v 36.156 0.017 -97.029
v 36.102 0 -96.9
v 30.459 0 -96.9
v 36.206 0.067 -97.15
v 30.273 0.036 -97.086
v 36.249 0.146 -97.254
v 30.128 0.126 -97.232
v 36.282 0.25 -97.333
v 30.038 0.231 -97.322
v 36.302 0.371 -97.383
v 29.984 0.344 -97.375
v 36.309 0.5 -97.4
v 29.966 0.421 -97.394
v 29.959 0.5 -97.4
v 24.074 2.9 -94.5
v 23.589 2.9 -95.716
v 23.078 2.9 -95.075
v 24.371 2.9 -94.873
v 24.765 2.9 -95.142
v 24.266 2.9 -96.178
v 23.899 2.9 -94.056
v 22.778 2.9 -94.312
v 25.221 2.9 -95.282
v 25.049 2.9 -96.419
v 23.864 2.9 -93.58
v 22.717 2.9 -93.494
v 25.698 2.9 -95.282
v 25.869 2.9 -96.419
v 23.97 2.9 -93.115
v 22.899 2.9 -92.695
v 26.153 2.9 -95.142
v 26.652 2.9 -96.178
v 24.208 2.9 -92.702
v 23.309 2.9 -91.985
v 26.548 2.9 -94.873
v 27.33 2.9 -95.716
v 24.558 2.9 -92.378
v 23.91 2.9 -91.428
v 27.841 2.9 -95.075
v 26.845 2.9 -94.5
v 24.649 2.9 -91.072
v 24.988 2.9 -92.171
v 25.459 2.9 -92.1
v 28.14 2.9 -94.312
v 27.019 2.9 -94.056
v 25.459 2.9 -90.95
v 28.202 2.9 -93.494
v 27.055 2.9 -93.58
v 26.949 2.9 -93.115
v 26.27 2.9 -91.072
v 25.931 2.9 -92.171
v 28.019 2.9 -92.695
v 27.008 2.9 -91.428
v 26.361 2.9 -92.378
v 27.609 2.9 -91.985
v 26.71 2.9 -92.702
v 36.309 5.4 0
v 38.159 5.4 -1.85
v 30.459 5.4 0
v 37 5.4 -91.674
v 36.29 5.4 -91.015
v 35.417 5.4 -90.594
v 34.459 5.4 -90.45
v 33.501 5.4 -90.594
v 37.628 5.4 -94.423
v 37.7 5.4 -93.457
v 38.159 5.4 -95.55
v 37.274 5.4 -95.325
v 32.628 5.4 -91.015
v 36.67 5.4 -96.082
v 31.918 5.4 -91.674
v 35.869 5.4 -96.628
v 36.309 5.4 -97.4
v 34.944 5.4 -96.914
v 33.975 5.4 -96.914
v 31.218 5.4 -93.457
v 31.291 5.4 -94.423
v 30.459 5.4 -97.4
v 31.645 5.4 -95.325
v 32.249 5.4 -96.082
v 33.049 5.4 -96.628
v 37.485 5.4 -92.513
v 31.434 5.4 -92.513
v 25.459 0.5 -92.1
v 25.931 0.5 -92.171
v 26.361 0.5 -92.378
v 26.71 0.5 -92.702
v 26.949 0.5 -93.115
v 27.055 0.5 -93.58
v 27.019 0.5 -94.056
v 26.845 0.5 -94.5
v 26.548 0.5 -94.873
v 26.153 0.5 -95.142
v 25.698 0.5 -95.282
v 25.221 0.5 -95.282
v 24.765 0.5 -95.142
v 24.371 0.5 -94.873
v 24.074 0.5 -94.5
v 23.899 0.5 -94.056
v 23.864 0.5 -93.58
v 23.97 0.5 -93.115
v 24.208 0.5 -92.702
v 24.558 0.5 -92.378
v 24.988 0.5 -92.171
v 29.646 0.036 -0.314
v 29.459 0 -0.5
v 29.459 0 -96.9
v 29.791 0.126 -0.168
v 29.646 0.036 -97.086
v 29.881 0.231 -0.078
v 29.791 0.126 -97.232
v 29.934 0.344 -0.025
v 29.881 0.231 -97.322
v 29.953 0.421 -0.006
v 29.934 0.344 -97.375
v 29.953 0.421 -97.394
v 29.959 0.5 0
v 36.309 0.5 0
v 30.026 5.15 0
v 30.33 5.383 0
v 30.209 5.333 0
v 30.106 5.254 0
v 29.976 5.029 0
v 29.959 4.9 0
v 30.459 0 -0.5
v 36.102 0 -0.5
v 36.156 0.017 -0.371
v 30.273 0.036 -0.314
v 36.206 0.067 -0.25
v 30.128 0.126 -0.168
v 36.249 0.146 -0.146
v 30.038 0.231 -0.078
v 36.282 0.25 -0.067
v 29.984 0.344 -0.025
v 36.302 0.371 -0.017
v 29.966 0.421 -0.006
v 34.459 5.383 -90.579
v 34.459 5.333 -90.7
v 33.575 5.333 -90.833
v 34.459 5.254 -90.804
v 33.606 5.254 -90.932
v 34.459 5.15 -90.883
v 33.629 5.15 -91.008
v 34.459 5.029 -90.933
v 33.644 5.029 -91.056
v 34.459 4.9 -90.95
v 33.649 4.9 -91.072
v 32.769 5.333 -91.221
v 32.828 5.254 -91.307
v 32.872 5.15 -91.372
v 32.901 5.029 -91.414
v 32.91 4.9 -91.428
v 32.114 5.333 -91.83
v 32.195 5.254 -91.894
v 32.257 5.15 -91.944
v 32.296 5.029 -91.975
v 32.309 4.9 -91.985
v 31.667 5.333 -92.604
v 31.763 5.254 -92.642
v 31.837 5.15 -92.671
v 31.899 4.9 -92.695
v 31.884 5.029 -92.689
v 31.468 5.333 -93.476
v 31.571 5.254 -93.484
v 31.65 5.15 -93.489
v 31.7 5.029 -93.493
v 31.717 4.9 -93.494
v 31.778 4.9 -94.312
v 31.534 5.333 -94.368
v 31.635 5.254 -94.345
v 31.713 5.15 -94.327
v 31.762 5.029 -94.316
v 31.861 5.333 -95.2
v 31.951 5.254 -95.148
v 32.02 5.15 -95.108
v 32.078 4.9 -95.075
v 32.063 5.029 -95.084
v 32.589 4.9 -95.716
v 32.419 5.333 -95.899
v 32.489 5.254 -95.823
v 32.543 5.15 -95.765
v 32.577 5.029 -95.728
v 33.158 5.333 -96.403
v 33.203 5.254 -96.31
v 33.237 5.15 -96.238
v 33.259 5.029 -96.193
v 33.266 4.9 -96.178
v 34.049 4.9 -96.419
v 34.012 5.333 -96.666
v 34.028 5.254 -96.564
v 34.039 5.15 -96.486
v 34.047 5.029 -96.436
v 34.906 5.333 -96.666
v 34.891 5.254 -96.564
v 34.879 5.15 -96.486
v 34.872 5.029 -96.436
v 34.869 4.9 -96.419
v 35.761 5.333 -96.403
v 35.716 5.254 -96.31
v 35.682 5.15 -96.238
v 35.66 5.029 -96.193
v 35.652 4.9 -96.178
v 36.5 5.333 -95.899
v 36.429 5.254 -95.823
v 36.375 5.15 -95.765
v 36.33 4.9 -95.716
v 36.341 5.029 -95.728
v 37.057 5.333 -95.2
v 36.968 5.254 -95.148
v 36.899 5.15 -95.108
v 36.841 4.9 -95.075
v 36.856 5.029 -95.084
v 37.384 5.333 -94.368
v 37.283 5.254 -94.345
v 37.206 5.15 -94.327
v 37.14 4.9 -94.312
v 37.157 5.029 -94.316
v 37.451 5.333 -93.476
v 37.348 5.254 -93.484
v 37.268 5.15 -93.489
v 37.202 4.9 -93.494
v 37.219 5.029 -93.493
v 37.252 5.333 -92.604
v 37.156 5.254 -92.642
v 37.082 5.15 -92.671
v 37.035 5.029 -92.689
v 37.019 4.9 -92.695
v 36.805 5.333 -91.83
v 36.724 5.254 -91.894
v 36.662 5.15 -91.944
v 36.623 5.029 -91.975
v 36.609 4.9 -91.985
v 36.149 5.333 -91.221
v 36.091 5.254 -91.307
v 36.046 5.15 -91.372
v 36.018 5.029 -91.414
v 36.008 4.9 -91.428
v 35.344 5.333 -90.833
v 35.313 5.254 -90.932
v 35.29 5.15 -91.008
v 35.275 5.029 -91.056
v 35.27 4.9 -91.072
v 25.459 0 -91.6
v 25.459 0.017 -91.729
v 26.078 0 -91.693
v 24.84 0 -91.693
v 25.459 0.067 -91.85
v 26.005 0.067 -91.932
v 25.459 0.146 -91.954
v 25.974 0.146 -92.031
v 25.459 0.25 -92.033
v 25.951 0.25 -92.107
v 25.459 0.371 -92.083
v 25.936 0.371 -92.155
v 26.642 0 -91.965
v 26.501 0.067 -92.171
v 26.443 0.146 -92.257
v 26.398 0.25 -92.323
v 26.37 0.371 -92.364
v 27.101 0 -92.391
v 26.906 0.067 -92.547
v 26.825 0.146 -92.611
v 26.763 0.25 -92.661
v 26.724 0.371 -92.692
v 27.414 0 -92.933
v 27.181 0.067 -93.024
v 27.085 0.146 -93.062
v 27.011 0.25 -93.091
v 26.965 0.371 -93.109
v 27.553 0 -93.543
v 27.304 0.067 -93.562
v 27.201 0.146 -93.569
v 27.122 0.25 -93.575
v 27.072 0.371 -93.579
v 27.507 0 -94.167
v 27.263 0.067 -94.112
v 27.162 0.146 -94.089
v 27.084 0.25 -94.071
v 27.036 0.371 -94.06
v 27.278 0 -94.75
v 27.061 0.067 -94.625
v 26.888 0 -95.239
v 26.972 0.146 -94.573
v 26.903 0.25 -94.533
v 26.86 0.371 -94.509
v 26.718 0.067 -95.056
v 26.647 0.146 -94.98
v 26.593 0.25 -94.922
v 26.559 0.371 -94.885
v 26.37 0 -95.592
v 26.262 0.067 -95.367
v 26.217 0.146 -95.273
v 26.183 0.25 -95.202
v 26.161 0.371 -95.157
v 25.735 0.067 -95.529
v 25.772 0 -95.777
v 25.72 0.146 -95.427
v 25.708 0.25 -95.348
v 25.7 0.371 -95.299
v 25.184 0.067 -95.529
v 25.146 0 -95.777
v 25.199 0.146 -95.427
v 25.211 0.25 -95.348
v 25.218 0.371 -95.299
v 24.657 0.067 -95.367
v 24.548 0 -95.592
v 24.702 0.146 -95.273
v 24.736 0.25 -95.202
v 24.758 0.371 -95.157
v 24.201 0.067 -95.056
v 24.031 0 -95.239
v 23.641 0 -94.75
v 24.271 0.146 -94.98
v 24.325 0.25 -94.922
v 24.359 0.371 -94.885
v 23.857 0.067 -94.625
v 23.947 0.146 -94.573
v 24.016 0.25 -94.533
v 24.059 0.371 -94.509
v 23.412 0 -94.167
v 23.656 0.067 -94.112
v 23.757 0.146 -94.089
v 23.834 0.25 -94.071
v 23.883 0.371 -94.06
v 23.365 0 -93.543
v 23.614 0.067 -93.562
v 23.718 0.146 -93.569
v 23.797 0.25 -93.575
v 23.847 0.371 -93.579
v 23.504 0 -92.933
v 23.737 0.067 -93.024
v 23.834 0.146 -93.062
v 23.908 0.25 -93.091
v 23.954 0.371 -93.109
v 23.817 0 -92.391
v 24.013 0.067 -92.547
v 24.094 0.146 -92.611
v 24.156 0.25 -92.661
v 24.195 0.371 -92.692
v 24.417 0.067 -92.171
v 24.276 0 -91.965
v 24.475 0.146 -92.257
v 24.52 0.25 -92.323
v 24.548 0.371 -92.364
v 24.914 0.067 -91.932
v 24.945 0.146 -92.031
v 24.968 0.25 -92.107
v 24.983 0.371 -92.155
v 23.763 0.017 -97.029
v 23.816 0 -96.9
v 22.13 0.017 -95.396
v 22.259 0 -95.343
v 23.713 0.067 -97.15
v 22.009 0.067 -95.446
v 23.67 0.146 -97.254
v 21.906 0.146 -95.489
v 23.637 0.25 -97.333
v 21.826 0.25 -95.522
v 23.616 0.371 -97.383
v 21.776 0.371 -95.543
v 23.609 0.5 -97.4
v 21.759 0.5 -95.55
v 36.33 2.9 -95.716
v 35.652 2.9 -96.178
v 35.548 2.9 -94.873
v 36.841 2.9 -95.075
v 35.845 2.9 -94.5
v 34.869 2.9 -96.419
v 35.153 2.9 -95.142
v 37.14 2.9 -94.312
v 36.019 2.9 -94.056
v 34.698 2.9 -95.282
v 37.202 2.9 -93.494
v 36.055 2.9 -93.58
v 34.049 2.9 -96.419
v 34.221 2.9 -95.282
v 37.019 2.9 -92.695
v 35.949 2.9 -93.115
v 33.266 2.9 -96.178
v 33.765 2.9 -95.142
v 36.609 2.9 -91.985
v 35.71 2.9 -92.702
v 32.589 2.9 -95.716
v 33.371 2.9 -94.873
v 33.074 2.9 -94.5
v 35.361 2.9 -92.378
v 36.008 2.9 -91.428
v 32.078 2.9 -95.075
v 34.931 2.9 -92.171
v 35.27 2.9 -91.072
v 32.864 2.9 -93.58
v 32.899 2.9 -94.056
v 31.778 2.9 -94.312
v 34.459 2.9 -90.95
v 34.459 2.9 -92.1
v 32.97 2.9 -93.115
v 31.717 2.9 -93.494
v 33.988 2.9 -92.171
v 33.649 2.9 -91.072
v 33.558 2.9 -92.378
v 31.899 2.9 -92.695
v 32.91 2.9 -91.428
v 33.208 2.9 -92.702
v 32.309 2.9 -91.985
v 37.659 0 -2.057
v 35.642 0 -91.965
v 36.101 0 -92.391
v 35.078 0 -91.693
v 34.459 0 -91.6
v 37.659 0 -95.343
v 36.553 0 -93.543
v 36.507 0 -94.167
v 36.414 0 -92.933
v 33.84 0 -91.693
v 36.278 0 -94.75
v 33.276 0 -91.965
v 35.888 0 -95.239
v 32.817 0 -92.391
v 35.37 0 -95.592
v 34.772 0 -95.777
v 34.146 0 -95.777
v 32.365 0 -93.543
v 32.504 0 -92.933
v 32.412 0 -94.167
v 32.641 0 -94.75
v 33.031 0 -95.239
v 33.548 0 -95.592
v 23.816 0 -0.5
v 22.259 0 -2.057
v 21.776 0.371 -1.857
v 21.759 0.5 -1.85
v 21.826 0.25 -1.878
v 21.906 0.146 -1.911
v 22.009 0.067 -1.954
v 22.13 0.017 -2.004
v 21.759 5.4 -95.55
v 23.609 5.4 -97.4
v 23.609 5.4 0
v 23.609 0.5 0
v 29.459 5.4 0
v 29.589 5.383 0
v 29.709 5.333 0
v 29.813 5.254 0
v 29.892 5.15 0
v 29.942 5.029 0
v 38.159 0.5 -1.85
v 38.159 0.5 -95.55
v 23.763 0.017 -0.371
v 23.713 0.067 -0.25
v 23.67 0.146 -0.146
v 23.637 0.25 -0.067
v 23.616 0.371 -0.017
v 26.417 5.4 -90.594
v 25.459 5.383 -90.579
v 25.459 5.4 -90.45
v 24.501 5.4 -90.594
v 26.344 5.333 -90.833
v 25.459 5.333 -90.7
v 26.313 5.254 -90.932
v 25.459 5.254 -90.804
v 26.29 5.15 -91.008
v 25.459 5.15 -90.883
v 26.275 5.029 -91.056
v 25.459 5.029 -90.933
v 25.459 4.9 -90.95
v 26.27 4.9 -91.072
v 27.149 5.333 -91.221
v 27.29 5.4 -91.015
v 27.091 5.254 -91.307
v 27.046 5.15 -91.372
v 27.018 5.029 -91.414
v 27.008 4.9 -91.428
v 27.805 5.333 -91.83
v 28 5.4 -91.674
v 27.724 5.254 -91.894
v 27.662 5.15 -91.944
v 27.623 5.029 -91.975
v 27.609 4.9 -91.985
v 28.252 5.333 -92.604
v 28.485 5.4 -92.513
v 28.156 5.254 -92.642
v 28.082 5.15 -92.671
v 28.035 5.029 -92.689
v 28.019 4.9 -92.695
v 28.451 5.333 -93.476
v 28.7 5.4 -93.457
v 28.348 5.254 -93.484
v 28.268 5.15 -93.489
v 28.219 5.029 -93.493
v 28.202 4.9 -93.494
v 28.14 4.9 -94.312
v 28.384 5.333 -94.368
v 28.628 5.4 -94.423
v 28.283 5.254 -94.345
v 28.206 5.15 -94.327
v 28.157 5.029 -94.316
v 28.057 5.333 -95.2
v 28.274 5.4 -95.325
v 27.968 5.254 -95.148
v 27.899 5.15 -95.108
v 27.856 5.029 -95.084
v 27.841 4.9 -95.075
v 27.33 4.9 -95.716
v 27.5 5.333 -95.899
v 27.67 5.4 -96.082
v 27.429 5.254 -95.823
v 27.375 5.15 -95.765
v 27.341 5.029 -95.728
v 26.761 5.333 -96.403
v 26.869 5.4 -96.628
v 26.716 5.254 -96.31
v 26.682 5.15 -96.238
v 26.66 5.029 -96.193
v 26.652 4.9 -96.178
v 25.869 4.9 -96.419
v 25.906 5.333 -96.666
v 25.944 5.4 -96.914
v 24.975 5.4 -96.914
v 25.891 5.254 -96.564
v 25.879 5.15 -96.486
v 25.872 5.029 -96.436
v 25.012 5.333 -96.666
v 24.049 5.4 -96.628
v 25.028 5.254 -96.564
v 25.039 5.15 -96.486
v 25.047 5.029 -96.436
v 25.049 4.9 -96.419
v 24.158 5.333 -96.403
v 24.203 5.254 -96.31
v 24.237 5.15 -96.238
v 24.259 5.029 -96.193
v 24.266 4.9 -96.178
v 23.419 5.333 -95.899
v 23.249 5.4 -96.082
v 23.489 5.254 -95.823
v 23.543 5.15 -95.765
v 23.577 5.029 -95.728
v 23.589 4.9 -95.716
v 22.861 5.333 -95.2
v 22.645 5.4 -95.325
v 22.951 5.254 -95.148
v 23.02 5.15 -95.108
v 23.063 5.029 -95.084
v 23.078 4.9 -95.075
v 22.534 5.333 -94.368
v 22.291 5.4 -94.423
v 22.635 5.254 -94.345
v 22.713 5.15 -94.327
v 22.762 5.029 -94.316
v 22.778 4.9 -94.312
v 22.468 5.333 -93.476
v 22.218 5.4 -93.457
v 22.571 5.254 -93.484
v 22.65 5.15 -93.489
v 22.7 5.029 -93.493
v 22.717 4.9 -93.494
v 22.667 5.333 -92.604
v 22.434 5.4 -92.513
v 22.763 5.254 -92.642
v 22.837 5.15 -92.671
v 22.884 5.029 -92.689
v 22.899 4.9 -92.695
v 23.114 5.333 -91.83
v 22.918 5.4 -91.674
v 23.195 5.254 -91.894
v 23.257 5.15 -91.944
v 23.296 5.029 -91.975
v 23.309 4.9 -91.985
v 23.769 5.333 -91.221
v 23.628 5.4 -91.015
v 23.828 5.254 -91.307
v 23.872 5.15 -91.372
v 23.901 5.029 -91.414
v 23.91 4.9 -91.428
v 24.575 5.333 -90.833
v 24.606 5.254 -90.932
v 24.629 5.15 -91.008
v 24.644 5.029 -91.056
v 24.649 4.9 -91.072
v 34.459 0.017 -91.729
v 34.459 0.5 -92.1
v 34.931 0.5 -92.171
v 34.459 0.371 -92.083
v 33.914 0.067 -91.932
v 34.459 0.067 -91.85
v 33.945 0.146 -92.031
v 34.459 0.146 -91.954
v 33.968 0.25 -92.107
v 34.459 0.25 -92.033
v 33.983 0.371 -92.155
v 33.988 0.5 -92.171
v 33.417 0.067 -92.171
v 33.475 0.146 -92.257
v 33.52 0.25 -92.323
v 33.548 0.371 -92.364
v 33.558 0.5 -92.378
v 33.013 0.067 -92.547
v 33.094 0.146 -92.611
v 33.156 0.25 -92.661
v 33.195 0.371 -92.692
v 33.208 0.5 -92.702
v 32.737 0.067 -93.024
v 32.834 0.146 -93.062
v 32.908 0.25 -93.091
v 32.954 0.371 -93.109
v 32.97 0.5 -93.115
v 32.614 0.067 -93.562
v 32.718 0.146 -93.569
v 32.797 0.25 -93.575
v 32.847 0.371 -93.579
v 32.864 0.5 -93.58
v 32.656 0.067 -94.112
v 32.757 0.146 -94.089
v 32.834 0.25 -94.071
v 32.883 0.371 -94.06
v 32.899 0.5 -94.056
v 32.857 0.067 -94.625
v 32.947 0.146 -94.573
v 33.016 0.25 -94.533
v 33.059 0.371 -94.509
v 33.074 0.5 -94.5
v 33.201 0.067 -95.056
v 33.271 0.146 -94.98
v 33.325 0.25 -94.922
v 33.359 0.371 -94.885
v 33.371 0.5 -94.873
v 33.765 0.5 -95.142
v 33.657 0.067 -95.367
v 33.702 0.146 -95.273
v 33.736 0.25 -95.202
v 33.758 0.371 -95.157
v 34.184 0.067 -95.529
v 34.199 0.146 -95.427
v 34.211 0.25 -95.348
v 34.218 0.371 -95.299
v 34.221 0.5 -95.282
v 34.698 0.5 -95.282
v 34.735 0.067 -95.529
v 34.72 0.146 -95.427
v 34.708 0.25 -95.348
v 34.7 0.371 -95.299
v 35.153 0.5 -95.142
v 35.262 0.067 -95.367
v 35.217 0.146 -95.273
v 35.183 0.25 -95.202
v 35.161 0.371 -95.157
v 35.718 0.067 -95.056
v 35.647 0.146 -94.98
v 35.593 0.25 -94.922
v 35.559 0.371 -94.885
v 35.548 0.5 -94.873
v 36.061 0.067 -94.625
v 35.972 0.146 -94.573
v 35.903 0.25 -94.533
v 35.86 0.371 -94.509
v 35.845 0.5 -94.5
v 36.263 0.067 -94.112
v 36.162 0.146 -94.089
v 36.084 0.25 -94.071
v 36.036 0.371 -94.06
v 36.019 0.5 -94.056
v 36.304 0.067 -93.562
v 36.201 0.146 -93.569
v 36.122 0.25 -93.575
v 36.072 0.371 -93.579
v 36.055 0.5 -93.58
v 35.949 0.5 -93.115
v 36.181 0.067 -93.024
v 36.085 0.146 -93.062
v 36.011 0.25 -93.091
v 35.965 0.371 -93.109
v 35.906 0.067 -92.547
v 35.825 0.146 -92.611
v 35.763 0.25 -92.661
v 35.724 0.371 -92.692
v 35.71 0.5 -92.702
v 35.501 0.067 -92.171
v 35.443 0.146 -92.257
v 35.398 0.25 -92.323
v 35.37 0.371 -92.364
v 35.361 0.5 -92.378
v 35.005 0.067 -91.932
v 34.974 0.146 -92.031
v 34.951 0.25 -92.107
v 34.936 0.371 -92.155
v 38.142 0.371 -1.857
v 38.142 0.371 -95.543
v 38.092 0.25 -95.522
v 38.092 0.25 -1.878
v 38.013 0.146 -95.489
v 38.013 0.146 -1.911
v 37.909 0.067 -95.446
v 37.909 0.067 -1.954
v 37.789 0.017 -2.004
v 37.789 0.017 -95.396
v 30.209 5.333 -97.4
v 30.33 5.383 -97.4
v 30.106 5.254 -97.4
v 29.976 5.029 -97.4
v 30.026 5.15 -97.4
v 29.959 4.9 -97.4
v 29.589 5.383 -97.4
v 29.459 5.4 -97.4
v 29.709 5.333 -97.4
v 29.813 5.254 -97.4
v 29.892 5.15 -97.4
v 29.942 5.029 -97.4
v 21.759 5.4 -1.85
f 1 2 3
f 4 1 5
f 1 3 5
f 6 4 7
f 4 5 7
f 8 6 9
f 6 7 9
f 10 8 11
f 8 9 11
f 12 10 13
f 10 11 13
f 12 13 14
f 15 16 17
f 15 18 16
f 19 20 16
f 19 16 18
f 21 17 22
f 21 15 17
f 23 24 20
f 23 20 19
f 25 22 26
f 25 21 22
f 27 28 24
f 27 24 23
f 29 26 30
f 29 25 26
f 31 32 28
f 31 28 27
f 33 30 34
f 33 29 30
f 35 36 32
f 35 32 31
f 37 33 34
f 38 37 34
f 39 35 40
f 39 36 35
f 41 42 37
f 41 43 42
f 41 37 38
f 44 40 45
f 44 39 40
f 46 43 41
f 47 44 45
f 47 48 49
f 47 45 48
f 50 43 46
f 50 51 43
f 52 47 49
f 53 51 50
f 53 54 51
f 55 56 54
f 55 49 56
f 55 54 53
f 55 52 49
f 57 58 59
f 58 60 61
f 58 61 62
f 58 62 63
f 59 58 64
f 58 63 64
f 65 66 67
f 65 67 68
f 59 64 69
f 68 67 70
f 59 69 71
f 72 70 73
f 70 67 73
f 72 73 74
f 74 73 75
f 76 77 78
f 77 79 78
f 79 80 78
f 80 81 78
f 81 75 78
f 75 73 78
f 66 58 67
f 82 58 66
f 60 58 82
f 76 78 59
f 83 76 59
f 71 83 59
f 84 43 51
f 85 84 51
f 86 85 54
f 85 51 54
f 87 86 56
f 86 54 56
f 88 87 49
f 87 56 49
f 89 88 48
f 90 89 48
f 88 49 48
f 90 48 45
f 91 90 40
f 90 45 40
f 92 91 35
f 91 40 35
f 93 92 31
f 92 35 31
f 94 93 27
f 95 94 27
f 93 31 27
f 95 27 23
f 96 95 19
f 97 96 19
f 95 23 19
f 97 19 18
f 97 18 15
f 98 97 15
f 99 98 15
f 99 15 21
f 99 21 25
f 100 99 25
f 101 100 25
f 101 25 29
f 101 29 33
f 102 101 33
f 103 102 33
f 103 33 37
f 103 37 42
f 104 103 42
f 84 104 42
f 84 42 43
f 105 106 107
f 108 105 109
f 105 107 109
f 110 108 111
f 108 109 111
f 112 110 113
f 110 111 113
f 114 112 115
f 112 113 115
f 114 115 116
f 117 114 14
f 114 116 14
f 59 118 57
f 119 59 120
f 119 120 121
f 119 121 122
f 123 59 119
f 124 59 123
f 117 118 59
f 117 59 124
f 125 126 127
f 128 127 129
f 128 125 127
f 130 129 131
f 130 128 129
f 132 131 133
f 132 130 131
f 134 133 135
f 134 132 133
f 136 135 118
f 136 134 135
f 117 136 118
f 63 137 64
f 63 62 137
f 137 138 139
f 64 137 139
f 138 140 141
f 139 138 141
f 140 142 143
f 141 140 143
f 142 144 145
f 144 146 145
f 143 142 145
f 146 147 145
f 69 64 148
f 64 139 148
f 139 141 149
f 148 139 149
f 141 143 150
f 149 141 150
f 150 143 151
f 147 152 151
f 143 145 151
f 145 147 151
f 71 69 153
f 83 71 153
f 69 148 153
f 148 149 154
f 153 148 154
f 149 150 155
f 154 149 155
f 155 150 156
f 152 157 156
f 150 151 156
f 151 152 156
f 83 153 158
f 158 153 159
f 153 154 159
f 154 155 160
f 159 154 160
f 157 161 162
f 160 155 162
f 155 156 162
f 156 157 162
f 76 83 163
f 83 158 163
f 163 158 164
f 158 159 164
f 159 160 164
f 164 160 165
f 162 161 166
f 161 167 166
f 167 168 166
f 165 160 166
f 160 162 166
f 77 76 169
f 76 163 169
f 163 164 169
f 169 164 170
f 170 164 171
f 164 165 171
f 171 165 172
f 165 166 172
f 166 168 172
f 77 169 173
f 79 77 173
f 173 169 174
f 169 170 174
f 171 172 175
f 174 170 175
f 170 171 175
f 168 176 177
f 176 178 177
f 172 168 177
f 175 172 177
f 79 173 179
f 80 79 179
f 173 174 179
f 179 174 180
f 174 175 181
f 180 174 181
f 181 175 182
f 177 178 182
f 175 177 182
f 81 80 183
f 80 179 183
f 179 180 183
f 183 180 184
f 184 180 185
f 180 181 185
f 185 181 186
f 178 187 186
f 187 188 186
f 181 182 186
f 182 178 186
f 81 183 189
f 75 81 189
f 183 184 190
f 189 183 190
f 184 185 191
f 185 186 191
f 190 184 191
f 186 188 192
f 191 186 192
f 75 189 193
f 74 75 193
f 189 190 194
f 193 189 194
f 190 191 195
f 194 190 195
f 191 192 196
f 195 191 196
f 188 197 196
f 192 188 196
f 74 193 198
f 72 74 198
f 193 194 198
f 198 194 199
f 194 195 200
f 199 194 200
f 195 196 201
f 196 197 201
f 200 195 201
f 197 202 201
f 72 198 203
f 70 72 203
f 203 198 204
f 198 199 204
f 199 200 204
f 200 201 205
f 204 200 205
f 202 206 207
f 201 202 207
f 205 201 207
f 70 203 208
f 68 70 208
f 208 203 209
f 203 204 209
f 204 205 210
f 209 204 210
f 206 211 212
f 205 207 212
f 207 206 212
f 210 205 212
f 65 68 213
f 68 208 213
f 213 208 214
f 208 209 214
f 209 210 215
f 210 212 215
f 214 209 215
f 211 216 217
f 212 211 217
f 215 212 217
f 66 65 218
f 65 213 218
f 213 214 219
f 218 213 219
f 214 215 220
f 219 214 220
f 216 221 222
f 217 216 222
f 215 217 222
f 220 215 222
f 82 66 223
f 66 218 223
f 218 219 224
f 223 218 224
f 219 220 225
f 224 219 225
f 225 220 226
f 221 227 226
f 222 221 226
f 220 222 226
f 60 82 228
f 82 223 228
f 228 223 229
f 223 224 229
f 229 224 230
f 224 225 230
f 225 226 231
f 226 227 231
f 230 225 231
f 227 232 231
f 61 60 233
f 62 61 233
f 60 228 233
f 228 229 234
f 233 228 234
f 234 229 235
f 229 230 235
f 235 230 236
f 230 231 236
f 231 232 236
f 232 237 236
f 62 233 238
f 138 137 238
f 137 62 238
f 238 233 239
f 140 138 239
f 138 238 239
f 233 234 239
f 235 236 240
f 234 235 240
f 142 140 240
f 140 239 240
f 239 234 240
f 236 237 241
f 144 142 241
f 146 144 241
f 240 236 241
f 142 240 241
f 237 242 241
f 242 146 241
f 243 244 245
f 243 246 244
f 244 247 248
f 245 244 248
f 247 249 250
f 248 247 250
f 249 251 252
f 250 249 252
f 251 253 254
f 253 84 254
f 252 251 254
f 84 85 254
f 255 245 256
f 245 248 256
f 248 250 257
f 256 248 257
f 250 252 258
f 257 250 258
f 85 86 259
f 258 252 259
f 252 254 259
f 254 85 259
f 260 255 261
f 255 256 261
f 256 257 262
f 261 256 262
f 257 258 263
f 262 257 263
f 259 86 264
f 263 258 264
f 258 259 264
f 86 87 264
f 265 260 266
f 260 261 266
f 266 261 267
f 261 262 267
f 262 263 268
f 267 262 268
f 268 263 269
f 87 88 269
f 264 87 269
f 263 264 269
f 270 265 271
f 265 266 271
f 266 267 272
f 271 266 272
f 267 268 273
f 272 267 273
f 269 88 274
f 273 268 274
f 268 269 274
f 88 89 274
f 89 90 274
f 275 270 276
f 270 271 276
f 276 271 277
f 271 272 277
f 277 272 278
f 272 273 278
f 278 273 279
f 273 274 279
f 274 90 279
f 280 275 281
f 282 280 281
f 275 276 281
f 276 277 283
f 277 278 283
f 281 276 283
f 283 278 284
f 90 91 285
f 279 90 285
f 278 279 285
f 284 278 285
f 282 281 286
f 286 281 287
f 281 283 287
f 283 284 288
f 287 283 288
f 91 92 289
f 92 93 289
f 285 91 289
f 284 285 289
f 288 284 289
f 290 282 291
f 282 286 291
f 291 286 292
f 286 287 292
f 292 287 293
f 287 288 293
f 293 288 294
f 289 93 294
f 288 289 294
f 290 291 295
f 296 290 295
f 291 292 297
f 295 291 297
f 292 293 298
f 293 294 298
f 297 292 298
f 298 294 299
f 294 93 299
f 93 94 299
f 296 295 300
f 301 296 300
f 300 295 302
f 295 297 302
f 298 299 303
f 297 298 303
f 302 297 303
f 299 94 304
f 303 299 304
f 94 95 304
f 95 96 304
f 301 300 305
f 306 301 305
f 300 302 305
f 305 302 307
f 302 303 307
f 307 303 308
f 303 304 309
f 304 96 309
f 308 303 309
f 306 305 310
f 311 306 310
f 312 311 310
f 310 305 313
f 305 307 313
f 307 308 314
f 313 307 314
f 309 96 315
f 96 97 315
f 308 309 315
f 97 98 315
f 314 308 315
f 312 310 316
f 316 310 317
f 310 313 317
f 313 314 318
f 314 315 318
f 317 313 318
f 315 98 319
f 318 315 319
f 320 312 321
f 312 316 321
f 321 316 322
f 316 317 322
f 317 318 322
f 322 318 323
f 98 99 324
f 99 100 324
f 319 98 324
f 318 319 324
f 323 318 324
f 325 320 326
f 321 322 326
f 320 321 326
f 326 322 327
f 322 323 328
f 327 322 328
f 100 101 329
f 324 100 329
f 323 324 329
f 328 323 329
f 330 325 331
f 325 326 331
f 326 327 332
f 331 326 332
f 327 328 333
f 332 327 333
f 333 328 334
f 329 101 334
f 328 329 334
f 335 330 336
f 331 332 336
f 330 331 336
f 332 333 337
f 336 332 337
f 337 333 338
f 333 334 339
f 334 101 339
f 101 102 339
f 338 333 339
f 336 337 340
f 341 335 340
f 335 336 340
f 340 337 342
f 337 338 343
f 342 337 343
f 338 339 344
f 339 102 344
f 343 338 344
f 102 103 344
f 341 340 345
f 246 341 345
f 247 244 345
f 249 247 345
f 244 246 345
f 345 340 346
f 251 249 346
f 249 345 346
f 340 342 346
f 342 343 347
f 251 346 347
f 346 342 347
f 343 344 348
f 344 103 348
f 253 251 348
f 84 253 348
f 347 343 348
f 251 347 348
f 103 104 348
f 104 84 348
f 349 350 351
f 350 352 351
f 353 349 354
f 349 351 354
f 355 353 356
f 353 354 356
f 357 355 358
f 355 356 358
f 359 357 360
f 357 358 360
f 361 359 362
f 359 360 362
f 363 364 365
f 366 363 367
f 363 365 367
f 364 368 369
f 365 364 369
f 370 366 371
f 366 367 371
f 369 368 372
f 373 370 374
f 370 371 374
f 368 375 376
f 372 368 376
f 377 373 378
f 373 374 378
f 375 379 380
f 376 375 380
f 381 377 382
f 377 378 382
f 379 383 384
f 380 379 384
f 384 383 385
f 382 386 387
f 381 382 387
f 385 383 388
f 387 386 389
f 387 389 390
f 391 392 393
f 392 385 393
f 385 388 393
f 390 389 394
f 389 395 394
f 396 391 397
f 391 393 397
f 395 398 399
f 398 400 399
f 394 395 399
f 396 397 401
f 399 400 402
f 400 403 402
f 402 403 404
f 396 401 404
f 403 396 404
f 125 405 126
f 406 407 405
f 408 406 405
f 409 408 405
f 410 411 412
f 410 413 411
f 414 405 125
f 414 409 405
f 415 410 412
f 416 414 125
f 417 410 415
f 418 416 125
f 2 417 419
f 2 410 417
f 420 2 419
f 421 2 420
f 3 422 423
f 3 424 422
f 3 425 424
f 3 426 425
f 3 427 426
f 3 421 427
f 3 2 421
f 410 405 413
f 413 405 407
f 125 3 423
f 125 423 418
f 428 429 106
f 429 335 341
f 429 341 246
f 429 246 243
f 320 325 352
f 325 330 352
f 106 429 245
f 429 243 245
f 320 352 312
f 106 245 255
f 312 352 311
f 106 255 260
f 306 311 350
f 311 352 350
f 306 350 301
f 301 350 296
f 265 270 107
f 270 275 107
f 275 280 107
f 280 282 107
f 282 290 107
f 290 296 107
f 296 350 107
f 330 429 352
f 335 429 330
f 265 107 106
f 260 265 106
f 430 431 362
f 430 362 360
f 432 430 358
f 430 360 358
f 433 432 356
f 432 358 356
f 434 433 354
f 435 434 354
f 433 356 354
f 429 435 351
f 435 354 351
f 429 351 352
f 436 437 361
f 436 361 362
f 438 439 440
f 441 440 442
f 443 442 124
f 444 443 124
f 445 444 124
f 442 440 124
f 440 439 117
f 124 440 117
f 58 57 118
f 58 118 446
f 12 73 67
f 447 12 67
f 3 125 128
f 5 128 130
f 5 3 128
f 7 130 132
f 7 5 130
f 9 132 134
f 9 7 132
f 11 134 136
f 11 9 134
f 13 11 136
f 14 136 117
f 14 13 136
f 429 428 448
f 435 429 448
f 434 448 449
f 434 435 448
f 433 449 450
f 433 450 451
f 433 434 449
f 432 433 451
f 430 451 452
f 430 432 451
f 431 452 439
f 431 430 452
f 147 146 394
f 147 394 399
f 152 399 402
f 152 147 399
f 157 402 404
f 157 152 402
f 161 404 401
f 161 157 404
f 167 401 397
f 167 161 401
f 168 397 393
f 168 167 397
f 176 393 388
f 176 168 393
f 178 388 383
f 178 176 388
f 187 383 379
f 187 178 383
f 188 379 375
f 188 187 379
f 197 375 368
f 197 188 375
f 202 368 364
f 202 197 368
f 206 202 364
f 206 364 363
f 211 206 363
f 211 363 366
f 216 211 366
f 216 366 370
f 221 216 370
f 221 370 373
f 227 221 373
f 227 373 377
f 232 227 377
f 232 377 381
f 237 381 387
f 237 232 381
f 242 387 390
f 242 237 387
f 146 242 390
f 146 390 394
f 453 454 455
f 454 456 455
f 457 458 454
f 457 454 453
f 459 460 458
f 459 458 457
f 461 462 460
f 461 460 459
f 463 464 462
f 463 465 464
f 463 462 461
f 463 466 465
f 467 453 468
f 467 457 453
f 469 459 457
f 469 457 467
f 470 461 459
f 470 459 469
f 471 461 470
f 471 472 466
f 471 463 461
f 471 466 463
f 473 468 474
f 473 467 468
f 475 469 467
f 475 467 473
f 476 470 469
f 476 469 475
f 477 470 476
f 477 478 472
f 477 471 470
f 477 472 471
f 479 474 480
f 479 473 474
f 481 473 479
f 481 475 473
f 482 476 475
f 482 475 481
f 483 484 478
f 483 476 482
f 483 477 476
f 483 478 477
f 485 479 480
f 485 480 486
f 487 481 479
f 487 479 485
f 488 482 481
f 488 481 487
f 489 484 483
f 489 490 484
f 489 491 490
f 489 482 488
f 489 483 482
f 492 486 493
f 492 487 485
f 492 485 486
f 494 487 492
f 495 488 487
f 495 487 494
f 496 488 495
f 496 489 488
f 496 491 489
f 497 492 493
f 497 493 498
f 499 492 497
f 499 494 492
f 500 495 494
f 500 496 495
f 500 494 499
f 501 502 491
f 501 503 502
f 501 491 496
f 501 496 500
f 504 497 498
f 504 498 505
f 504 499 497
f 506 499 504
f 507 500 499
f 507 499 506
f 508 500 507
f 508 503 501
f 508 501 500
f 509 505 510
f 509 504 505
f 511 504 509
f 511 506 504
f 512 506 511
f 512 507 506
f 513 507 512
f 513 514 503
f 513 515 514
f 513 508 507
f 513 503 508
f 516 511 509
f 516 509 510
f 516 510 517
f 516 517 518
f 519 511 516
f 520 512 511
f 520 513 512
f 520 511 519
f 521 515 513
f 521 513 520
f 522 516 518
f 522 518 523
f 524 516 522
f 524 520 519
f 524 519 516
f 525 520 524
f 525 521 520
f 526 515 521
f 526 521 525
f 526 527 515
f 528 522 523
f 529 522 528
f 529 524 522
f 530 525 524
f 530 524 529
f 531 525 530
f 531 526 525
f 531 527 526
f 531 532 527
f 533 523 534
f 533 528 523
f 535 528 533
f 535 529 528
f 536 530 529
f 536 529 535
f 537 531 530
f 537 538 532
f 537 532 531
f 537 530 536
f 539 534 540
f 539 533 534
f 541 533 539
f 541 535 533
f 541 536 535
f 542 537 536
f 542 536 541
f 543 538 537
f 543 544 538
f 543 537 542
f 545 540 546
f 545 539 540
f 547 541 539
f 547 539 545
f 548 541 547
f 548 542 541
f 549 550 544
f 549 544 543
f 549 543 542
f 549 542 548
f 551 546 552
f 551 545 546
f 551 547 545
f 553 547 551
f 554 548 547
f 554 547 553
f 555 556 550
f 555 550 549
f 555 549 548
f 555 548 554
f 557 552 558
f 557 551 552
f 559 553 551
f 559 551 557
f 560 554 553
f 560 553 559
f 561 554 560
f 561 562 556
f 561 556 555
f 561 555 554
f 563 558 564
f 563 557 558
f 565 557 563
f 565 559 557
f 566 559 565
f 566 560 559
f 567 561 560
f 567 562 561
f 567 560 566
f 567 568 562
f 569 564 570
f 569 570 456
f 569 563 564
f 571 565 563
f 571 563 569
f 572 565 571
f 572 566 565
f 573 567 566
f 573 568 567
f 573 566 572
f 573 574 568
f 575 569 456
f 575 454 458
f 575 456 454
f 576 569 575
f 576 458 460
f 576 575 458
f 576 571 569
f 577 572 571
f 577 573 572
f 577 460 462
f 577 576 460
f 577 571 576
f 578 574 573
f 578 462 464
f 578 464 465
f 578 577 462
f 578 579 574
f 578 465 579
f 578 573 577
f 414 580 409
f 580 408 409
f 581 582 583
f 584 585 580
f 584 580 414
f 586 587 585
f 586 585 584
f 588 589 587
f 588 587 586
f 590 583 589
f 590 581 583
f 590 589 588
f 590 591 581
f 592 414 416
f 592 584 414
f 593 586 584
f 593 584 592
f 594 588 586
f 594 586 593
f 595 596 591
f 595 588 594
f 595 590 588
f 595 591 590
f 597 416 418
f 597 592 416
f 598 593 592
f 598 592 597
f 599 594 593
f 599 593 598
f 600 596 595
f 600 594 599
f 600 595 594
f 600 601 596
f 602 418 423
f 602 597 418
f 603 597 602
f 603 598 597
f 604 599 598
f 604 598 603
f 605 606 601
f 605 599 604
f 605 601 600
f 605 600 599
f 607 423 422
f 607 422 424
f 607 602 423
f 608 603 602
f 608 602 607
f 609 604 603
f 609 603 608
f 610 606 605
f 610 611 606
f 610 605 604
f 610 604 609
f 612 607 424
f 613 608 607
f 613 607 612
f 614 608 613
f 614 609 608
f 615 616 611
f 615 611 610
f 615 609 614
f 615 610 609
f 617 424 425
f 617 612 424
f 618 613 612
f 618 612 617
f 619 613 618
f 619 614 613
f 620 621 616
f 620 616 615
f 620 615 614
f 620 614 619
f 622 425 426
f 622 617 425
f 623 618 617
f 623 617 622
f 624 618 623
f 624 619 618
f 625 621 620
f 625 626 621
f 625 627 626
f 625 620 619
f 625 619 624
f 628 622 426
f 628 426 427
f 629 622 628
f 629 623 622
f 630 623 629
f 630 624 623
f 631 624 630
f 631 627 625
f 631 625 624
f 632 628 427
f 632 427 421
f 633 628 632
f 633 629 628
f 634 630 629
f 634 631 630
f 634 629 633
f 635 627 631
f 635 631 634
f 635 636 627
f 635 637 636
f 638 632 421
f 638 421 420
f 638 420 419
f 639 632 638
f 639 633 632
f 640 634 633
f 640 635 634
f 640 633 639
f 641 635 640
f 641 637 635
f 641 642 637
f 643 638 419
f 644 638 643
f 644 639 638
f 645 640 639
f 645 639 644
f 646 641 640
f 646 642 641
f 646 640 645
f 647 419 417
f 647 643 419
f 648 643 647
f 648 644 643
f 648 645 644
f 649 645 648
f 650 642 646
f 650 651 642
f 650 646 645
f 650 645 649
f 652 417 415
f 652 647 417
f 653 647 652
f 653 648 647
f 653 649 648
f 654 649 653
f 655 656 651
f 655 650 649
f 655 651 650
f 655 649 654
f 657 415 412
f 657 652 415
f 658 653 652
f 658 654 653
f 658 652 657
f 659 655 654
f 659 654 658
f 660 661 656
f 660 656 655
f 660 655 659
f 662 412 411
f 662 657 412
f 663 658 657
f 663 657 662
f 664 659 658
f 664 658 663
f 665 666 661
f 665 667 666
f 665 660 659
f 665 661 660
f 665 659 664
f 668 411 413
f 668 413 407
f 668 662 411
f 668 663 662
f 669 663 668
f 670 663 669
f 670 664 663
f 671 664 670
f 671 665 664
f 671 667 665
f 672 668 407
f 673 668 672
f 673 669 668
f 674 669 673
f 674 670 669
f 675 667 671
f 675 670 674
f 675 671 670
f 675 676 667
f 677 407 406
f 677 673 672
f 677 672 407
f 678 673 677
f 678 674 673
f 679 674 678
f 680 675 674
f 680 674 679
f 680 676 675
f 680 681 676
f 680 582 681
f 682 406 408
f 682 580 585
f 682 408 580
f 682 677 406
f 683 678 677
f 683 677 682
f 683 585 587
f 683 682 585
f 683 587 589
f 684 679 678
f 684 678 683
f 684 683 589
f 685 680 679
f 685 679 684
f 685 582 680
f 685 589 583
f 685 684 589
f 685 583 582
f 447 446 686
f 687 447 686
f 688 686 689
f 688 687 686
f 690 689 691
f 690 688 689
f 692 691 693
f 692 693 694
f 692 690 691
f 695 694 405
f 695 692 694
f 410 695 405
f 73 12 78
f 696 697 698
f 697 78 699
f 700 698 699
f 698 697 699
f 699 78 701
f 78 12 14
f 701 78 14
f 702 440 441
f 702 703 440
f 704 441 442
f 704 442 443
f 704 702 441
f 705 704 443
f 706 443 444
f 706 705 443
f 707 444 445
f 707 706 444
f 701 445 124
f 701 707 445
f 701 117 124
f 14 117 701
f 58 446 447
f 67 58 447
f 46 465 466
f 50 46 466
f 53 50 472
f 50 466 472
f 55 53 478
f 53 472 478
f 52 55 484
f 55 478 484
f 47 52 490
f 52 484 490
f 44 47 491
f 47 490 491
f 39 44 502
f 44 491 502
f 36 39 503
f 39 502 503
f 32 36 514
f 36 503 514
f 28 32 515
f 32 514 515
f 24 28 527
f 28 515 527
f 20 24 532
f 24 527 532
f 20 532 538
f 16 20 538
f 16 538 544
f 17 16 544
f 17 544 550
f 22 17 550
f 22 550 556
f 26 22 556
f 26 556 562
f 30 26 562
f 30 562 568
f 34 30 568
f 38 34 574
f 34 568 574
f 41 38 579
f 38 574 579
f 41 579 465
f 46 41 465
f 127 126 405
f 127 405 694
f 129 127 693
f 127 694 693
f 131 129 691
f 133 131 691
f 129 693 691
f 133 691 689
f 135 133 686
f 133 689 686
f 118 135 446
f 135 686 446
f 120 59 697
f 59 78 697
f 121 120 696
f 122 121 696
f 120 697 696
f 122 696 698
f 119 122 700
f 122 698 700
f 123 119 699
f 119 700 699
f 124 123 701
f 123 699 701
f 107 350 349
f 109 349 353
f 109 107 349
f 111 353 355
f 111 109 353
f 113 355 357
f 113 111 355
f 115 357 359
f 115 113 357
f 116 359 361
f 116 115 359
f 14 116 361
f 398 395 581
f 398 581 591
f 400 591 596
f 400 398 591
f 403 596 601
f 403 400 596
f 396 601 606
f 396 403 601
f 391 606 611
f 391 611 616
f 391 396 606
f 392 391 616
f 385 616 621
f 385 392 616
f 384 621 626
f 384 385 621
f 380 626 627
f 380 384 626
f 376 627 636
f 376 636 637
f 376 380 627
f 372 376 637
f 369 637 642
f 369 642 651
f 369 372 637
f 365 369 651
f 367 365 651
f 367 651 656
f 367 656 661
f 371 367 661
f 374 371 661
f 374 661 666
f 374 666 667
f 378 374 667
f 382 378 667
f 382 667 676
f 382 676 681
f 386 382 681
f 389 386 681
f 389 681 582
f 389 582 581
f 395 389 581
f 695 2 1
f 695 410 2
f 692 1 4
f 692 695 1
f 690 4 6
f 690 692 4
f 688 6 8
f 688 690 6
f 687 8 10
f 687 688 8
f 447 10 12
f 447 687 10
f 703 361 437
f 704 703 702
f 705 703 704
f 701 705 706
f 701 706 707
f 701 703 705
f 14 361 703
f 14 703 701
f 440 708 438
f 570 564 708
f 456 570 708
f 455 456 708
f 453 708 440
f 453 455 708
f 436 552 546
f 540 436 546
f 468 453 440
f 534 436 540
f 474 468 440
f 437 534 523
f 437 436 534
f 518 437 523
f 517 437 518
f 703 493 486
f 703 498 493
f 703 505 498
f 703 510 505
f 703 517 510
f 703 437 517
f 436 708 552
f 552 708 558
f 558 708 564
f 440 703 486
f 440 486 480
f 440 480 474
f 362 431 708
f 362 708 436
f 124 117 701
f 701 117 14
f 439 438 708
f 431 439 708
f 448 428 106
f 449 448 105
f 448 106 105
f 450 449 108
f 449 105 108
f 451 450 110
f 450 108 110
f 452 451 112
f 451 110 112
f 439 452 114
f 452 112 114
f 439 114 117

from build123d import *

# Parameters (mm, degrees)
SKETCH_1_W          = 8.2
SKETCH_1_H          = 97.4
EXTRUDE_1_DEPTH     = 5.4
SKETCH_2_R          = 1.6
CUT_EXTRUDE_1_DEPTH = 103.046451594
FILLET_1_R          = 0.5
FILLET_2_R          = 0.5
SKETCH_3_R          = 2.75
CUT_EXTRUDE_2_DEPTH = 2.5
FILLET_3_R          = 0.5


with BuildPart() as part:
    # 草图1 → 凸台-拉伸1 (new body)
    with BuildSketch(Plane(origin=(0, 0, 0), x_dir=(1, 0, 0), z_dir=(0, 1, 0))):
        with Locations((25.859277076, 48.7)):
            Rectangle(SKETCH_1_W, SKETCH_1_H)
    extrude(amount=EXTRUDE_1_DEPTH)

    # 草图2 → 切除-拉伸1 (cut, through all)
    with BuildSketch(Plane(origin=(0, 5.4, 0), x_dir=(1, 0, 0), z_dir=(0, 1, 0))):
        with Locations(Location((25.459277076, 93.7, 0), (0, 0, 270))):
            Circle(SKETCH_2_R)
        Polygon((21.759277076, 97.4), (23.609277076, 97.4), (21.759277076, 95.55), align=None)
        Polygon((21.759277076, 0), (23.609277076, 0), (21.759277076, 1.85), align=None)
    extrude(amount=-CUT_EXTRUDE_1_DEPTH, mode=Mode.SUBTRACT)

    # 圆角1
    fillet_1_edges = [part.edges().sort_by_distance(p)[0] for p in [
        (21.759277076, 0, -48.7),
        (26.784277076, 0, 0),
        (22.684277076, 0, -96.475),
        (22.684277076, 0, -0.925),
        (25.459277076, 0, -95.3),
        (26.784277076, 0, -97.4),
        (29.959277076, 0, -48.7),
    ]]
    fillet(fillet_1_edges, radius=FILLET_1_R)

    # 圆角2
    fillet_2_edges = [part.edges().sort_by_distance(p)[0] for p in [
        (29.959277076, 5.4, -48.7),
    ]]
    fillet(fillet_2_edges, radius=FILLET_2_R)

    # 草图3 → 切除-拉伸2 (cut)
    with BuildSketch(Plane(origin=(0, 5.4, 0), x_dir=(1, 0, 0), z_dir=(0, 1, 0))):
        with Locations(Location((25.459277076, 93.7, 0), (0, 0, 270))):
            Circle(SKETCH_3_R)
    extrude(amount=-CUT_EXTRUDE_2_DEPTH, mode=Mode.SUBTRACT)

    # 圆角3
    fillet_3_edges = [part.edges().sort_by_distance(p)[0] for p in [
        (25.459277076, 5.4, -96.45),
    ]]
    fillet(fillet_3_edges, radius=FILLET_3_R)


with BuildPart() as body_2:
    # 镜向1: mirrored copy
    add(part.part.mirror(Plane(origin=(29.959277076, 5.4, 0), x_dir=(0, 0, 1), z_dir=(-1, 0, 0))))


solid = Compound([part.part, body_2.part])
